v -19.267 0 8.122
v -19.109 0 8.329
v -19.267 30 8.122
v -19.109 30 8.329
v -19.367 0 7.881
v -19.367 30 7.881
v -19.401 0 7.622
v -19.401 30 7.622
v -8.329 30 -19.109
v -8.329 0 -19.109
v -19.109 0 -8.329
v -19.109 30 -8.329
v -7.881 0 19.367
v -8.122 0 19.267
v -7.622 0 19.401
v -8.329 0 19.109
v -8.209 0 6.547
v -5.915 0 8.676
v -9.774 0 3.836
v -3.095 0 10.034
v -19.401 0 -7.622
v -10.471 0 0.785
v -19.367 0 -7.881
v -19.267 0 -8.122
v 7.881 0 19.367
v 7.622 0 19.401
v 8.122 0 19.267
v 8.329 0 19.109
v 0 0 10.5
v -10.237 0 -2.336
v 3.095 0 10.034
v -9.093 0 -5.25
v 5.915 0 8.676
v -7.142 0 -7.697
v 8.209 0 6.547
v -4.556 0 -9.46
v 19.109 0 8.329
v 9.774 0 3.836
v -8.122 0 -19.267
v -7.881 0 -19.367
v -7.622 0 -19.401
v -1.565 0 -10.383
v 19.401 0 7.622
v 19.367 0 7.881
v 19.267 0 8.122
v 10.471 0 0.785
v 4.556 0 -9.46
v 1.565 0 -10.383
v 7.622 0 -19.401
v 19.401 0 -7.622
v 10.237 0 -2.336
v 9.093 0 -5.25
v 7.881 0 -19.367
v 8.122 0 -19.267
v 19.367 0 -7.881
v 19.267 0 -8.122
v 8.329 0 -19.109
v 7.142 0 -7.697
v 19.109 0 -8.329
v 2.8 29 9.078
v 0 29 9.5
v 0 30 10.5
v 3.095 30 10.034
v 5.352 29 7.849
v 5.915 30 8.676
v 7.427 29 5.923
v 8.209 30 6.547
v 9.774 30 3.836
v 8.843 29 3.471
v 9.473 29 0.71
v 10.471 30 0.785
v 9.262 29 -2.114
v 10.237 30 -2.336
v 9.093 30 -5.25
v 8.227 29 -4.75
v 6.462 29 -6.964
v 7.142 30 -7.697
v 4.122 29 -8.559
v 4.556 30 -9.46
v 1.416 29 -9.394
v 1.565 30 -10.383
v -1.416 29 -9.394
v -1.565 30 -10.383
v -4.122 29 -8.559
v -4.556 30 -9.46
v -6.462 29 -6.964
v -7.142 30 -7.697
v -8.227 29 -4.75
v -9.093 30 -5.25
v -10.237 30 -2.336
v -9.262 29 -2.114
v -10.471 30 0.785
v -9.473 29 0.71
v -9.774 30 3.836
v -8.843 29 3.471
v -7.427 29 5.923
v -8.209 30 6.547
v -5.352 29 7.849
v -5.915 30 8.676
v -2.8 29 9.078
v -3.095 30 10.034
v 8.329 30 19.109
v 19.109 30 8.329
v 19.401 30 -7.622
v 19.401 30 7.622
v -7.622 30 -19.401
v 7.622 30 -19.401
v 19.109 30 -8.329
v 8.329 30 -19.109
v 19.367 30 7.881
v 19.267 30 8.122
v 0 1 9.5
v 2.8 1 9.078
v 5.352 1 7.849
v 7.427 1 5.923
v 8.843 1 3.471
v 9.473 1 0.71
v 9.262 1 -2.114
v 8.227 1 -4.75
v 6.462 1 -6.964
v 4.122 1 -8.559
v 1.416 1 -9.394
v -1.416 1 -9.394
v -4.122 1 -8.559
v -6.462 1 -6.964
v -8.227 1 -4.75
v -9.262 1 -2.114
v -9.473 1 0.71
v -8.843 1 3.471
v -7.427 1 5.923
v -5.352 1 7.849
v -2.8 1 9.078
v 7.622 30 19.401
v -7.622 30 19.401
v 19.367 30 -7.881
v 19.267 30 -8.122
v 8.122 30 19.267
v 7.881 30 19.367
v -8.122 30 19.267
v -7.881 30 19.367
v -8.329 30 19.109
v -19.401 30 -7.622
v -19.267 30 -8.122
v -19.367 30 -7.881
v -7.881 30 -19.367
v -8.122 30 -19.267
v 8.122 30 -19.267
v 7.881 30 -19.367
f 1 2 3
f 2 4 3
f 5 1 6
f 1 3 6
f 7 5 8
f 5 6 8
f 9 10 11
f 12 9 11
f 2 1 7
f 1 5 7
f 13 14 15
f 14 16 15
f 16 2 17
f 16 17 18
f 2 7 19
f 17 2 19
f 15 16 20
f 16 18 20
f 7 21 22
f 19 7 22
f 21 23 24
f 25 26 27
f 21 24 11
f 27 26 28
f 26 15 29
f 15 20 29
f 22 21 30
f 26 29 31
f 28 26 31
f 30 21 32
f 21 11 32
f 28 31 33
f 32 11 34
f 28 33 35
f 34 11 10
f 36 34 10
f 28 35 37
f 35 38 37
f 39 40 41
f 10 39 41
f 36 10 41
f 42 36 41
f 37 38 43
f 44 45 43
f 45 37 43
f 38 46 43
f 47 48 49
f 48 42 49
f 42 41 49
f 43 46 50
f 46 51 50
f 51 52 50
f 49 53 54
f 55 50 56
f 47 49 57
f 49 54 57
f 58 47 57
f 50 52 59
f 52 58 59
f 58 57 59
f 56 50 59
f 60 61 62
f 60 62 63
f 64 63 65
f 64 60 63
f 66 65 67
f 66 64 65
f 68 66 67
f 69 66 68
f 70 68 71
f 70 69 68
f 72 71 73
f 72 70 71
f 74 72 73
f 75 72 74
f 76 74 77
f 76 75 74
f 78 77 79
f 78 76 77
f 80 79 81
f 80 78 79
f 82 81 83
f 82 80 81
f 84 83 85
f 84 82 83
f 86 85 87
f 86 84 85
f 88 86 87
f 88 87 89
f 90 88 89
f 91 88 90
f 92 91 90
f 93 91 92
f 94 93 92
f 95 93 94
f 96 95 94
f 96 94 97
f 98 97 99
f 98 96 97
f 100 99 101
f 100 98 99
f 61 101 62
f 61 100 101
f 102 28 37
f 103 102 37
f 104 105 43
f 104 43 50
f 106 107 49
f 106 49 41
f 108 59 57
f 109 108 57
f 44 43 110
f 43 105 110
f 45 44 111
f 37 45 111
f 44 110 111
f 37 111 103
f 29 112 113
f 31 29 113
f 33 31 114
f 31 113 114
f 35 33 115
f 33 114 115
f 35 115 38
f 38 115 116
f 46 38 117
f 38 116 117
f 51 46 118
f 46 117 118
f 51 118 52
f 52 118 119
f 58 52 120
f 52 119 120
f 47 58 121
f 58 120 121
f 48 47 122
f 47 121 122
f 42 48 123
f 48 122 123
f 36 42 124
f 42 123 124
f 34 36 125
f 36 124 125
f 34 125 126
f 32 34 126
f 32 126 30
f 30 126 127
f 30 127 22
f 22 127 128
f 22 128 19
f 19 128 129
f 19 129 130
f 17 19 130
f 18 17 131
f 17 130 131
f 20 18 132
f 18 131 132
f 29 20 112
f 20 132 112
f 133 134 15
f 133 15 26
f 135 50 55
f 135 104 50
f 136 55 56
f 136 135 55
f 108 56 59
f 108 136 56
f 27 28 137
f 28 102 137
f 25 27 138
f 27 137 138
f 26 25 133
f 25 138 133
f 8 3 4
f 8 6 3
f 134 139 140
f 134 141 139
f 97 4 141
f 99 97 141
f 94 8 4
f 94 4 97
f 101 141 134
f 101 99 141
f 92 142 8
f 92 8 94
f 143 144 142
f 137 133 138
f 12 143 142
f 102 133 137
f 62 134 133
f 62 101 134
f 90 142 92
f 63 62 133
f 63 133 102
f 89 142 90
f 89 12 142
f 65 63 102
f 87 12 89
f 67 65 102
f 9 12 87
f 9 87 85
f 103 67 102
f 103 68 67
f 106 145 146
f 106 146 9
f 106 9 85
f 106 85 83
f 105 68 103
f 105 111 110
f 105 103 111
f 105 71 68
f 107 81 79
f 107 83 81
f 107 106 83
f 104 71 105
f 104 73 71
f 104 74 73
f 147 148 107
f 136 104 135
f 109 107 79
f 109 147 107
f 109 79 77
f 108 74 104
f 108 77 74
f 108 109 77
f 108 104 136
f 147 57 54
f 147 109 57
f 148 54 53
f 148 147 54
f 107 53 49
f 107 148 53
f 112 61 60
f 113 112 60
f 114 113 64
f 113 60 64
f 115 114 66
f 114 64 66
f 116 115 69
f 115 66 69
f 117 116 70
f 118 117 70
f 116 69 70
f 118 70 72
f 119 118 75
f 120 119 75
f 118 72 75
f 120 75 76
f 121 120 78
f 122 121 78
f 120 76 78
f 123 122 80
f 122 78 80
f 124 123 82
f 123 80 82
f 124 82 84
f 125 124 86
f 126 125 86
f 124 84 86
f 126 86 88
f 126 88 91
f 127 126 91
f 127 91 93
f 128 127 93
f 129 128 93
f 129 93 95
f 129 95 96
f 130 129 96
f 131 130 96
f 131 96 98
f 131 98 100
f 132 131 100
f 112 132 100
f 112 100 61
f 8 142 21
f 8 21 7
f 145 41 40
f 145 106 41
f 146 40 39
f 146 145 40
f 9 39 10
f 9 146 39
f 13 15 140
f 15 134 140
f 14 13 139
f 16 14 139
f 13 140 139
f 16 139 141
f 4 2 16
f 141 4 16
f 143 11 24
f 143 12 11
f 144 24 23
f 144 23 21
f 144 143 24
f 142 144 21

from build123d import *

# Parameters (mm, degrees)
BOSS_EXTRUDE1_DEPTH = 30
SKETCH3_R           = 9.5
CUT_EXTRUDE1_DEPTH  = 41.655062299
CHAMFER1_SIZE       = 1
FILLET1_R           = 1


with BuildPart() as part:
    # Sketch2 → Boss-Extrude1 (new body)
    with BuildSketch(Plane(origin=(0, 0, 0), x_dir=(1, 0, 0), z_dir=(0, 1, 0))):
        Polygon((19.401470183, -8.03635208), (19.401470183, 8.03635208), (8.03635208, 19.401470183), (-8.03635208, 19.401470183), (-19.401470183, 8.03635208), (-19.401470183, -8.03635208), (-8.03635208, -19.401470183), (8.03635208, -19.401470183), align=None)
    extrude(amount=BOSS_EXTRUDE1_DEPTH)

    # Sketch3 → Cut-Extrude1 (cut, through all)
    with BuildSketch(Plane(origin=(0, 30, 0), x_dir=(1, 0, 0), z_dir=(0, 1, 0))):
        with Locations(Location((0, 0, 0), (0, 0, 270))):
            Circle(SKETCH3_R)
    extrude(amount=-CUT_EXTRUDE1_DEPTH, mode=Mode.SUBTRACT)

    # Chamfer1
    chamfer1_edges = [part.edges().sort_by_distance(p)[0] for p in [
        (0, 0, -9.5),
        (0, 30, -9.5),
    ]]
    chamfer(chamfer1_edges, length=CHAMFER1_SIZE)

    # Fillet1
    fillet1_edges = [part.edges().sort_by_distance(p)[0] for p in [
        (19.401470183, 15, -8.03635208),
        (19.401470183, 15, 8.03635208),
        (8.03635208, 15, 19.401470183),
        (-8.03635208, 15, 19.401470183),
        (-19.401470183, 15, 8.03635208),
        (-19.401470183, 15, -8.03635208),
        (-8.03635208, 15, -19.401470183),
        (8.03635208, 15, -19.401470183),
    ]]
    fillet(fillet1_edges, radius=FILLET1_R)


solid = part.part
